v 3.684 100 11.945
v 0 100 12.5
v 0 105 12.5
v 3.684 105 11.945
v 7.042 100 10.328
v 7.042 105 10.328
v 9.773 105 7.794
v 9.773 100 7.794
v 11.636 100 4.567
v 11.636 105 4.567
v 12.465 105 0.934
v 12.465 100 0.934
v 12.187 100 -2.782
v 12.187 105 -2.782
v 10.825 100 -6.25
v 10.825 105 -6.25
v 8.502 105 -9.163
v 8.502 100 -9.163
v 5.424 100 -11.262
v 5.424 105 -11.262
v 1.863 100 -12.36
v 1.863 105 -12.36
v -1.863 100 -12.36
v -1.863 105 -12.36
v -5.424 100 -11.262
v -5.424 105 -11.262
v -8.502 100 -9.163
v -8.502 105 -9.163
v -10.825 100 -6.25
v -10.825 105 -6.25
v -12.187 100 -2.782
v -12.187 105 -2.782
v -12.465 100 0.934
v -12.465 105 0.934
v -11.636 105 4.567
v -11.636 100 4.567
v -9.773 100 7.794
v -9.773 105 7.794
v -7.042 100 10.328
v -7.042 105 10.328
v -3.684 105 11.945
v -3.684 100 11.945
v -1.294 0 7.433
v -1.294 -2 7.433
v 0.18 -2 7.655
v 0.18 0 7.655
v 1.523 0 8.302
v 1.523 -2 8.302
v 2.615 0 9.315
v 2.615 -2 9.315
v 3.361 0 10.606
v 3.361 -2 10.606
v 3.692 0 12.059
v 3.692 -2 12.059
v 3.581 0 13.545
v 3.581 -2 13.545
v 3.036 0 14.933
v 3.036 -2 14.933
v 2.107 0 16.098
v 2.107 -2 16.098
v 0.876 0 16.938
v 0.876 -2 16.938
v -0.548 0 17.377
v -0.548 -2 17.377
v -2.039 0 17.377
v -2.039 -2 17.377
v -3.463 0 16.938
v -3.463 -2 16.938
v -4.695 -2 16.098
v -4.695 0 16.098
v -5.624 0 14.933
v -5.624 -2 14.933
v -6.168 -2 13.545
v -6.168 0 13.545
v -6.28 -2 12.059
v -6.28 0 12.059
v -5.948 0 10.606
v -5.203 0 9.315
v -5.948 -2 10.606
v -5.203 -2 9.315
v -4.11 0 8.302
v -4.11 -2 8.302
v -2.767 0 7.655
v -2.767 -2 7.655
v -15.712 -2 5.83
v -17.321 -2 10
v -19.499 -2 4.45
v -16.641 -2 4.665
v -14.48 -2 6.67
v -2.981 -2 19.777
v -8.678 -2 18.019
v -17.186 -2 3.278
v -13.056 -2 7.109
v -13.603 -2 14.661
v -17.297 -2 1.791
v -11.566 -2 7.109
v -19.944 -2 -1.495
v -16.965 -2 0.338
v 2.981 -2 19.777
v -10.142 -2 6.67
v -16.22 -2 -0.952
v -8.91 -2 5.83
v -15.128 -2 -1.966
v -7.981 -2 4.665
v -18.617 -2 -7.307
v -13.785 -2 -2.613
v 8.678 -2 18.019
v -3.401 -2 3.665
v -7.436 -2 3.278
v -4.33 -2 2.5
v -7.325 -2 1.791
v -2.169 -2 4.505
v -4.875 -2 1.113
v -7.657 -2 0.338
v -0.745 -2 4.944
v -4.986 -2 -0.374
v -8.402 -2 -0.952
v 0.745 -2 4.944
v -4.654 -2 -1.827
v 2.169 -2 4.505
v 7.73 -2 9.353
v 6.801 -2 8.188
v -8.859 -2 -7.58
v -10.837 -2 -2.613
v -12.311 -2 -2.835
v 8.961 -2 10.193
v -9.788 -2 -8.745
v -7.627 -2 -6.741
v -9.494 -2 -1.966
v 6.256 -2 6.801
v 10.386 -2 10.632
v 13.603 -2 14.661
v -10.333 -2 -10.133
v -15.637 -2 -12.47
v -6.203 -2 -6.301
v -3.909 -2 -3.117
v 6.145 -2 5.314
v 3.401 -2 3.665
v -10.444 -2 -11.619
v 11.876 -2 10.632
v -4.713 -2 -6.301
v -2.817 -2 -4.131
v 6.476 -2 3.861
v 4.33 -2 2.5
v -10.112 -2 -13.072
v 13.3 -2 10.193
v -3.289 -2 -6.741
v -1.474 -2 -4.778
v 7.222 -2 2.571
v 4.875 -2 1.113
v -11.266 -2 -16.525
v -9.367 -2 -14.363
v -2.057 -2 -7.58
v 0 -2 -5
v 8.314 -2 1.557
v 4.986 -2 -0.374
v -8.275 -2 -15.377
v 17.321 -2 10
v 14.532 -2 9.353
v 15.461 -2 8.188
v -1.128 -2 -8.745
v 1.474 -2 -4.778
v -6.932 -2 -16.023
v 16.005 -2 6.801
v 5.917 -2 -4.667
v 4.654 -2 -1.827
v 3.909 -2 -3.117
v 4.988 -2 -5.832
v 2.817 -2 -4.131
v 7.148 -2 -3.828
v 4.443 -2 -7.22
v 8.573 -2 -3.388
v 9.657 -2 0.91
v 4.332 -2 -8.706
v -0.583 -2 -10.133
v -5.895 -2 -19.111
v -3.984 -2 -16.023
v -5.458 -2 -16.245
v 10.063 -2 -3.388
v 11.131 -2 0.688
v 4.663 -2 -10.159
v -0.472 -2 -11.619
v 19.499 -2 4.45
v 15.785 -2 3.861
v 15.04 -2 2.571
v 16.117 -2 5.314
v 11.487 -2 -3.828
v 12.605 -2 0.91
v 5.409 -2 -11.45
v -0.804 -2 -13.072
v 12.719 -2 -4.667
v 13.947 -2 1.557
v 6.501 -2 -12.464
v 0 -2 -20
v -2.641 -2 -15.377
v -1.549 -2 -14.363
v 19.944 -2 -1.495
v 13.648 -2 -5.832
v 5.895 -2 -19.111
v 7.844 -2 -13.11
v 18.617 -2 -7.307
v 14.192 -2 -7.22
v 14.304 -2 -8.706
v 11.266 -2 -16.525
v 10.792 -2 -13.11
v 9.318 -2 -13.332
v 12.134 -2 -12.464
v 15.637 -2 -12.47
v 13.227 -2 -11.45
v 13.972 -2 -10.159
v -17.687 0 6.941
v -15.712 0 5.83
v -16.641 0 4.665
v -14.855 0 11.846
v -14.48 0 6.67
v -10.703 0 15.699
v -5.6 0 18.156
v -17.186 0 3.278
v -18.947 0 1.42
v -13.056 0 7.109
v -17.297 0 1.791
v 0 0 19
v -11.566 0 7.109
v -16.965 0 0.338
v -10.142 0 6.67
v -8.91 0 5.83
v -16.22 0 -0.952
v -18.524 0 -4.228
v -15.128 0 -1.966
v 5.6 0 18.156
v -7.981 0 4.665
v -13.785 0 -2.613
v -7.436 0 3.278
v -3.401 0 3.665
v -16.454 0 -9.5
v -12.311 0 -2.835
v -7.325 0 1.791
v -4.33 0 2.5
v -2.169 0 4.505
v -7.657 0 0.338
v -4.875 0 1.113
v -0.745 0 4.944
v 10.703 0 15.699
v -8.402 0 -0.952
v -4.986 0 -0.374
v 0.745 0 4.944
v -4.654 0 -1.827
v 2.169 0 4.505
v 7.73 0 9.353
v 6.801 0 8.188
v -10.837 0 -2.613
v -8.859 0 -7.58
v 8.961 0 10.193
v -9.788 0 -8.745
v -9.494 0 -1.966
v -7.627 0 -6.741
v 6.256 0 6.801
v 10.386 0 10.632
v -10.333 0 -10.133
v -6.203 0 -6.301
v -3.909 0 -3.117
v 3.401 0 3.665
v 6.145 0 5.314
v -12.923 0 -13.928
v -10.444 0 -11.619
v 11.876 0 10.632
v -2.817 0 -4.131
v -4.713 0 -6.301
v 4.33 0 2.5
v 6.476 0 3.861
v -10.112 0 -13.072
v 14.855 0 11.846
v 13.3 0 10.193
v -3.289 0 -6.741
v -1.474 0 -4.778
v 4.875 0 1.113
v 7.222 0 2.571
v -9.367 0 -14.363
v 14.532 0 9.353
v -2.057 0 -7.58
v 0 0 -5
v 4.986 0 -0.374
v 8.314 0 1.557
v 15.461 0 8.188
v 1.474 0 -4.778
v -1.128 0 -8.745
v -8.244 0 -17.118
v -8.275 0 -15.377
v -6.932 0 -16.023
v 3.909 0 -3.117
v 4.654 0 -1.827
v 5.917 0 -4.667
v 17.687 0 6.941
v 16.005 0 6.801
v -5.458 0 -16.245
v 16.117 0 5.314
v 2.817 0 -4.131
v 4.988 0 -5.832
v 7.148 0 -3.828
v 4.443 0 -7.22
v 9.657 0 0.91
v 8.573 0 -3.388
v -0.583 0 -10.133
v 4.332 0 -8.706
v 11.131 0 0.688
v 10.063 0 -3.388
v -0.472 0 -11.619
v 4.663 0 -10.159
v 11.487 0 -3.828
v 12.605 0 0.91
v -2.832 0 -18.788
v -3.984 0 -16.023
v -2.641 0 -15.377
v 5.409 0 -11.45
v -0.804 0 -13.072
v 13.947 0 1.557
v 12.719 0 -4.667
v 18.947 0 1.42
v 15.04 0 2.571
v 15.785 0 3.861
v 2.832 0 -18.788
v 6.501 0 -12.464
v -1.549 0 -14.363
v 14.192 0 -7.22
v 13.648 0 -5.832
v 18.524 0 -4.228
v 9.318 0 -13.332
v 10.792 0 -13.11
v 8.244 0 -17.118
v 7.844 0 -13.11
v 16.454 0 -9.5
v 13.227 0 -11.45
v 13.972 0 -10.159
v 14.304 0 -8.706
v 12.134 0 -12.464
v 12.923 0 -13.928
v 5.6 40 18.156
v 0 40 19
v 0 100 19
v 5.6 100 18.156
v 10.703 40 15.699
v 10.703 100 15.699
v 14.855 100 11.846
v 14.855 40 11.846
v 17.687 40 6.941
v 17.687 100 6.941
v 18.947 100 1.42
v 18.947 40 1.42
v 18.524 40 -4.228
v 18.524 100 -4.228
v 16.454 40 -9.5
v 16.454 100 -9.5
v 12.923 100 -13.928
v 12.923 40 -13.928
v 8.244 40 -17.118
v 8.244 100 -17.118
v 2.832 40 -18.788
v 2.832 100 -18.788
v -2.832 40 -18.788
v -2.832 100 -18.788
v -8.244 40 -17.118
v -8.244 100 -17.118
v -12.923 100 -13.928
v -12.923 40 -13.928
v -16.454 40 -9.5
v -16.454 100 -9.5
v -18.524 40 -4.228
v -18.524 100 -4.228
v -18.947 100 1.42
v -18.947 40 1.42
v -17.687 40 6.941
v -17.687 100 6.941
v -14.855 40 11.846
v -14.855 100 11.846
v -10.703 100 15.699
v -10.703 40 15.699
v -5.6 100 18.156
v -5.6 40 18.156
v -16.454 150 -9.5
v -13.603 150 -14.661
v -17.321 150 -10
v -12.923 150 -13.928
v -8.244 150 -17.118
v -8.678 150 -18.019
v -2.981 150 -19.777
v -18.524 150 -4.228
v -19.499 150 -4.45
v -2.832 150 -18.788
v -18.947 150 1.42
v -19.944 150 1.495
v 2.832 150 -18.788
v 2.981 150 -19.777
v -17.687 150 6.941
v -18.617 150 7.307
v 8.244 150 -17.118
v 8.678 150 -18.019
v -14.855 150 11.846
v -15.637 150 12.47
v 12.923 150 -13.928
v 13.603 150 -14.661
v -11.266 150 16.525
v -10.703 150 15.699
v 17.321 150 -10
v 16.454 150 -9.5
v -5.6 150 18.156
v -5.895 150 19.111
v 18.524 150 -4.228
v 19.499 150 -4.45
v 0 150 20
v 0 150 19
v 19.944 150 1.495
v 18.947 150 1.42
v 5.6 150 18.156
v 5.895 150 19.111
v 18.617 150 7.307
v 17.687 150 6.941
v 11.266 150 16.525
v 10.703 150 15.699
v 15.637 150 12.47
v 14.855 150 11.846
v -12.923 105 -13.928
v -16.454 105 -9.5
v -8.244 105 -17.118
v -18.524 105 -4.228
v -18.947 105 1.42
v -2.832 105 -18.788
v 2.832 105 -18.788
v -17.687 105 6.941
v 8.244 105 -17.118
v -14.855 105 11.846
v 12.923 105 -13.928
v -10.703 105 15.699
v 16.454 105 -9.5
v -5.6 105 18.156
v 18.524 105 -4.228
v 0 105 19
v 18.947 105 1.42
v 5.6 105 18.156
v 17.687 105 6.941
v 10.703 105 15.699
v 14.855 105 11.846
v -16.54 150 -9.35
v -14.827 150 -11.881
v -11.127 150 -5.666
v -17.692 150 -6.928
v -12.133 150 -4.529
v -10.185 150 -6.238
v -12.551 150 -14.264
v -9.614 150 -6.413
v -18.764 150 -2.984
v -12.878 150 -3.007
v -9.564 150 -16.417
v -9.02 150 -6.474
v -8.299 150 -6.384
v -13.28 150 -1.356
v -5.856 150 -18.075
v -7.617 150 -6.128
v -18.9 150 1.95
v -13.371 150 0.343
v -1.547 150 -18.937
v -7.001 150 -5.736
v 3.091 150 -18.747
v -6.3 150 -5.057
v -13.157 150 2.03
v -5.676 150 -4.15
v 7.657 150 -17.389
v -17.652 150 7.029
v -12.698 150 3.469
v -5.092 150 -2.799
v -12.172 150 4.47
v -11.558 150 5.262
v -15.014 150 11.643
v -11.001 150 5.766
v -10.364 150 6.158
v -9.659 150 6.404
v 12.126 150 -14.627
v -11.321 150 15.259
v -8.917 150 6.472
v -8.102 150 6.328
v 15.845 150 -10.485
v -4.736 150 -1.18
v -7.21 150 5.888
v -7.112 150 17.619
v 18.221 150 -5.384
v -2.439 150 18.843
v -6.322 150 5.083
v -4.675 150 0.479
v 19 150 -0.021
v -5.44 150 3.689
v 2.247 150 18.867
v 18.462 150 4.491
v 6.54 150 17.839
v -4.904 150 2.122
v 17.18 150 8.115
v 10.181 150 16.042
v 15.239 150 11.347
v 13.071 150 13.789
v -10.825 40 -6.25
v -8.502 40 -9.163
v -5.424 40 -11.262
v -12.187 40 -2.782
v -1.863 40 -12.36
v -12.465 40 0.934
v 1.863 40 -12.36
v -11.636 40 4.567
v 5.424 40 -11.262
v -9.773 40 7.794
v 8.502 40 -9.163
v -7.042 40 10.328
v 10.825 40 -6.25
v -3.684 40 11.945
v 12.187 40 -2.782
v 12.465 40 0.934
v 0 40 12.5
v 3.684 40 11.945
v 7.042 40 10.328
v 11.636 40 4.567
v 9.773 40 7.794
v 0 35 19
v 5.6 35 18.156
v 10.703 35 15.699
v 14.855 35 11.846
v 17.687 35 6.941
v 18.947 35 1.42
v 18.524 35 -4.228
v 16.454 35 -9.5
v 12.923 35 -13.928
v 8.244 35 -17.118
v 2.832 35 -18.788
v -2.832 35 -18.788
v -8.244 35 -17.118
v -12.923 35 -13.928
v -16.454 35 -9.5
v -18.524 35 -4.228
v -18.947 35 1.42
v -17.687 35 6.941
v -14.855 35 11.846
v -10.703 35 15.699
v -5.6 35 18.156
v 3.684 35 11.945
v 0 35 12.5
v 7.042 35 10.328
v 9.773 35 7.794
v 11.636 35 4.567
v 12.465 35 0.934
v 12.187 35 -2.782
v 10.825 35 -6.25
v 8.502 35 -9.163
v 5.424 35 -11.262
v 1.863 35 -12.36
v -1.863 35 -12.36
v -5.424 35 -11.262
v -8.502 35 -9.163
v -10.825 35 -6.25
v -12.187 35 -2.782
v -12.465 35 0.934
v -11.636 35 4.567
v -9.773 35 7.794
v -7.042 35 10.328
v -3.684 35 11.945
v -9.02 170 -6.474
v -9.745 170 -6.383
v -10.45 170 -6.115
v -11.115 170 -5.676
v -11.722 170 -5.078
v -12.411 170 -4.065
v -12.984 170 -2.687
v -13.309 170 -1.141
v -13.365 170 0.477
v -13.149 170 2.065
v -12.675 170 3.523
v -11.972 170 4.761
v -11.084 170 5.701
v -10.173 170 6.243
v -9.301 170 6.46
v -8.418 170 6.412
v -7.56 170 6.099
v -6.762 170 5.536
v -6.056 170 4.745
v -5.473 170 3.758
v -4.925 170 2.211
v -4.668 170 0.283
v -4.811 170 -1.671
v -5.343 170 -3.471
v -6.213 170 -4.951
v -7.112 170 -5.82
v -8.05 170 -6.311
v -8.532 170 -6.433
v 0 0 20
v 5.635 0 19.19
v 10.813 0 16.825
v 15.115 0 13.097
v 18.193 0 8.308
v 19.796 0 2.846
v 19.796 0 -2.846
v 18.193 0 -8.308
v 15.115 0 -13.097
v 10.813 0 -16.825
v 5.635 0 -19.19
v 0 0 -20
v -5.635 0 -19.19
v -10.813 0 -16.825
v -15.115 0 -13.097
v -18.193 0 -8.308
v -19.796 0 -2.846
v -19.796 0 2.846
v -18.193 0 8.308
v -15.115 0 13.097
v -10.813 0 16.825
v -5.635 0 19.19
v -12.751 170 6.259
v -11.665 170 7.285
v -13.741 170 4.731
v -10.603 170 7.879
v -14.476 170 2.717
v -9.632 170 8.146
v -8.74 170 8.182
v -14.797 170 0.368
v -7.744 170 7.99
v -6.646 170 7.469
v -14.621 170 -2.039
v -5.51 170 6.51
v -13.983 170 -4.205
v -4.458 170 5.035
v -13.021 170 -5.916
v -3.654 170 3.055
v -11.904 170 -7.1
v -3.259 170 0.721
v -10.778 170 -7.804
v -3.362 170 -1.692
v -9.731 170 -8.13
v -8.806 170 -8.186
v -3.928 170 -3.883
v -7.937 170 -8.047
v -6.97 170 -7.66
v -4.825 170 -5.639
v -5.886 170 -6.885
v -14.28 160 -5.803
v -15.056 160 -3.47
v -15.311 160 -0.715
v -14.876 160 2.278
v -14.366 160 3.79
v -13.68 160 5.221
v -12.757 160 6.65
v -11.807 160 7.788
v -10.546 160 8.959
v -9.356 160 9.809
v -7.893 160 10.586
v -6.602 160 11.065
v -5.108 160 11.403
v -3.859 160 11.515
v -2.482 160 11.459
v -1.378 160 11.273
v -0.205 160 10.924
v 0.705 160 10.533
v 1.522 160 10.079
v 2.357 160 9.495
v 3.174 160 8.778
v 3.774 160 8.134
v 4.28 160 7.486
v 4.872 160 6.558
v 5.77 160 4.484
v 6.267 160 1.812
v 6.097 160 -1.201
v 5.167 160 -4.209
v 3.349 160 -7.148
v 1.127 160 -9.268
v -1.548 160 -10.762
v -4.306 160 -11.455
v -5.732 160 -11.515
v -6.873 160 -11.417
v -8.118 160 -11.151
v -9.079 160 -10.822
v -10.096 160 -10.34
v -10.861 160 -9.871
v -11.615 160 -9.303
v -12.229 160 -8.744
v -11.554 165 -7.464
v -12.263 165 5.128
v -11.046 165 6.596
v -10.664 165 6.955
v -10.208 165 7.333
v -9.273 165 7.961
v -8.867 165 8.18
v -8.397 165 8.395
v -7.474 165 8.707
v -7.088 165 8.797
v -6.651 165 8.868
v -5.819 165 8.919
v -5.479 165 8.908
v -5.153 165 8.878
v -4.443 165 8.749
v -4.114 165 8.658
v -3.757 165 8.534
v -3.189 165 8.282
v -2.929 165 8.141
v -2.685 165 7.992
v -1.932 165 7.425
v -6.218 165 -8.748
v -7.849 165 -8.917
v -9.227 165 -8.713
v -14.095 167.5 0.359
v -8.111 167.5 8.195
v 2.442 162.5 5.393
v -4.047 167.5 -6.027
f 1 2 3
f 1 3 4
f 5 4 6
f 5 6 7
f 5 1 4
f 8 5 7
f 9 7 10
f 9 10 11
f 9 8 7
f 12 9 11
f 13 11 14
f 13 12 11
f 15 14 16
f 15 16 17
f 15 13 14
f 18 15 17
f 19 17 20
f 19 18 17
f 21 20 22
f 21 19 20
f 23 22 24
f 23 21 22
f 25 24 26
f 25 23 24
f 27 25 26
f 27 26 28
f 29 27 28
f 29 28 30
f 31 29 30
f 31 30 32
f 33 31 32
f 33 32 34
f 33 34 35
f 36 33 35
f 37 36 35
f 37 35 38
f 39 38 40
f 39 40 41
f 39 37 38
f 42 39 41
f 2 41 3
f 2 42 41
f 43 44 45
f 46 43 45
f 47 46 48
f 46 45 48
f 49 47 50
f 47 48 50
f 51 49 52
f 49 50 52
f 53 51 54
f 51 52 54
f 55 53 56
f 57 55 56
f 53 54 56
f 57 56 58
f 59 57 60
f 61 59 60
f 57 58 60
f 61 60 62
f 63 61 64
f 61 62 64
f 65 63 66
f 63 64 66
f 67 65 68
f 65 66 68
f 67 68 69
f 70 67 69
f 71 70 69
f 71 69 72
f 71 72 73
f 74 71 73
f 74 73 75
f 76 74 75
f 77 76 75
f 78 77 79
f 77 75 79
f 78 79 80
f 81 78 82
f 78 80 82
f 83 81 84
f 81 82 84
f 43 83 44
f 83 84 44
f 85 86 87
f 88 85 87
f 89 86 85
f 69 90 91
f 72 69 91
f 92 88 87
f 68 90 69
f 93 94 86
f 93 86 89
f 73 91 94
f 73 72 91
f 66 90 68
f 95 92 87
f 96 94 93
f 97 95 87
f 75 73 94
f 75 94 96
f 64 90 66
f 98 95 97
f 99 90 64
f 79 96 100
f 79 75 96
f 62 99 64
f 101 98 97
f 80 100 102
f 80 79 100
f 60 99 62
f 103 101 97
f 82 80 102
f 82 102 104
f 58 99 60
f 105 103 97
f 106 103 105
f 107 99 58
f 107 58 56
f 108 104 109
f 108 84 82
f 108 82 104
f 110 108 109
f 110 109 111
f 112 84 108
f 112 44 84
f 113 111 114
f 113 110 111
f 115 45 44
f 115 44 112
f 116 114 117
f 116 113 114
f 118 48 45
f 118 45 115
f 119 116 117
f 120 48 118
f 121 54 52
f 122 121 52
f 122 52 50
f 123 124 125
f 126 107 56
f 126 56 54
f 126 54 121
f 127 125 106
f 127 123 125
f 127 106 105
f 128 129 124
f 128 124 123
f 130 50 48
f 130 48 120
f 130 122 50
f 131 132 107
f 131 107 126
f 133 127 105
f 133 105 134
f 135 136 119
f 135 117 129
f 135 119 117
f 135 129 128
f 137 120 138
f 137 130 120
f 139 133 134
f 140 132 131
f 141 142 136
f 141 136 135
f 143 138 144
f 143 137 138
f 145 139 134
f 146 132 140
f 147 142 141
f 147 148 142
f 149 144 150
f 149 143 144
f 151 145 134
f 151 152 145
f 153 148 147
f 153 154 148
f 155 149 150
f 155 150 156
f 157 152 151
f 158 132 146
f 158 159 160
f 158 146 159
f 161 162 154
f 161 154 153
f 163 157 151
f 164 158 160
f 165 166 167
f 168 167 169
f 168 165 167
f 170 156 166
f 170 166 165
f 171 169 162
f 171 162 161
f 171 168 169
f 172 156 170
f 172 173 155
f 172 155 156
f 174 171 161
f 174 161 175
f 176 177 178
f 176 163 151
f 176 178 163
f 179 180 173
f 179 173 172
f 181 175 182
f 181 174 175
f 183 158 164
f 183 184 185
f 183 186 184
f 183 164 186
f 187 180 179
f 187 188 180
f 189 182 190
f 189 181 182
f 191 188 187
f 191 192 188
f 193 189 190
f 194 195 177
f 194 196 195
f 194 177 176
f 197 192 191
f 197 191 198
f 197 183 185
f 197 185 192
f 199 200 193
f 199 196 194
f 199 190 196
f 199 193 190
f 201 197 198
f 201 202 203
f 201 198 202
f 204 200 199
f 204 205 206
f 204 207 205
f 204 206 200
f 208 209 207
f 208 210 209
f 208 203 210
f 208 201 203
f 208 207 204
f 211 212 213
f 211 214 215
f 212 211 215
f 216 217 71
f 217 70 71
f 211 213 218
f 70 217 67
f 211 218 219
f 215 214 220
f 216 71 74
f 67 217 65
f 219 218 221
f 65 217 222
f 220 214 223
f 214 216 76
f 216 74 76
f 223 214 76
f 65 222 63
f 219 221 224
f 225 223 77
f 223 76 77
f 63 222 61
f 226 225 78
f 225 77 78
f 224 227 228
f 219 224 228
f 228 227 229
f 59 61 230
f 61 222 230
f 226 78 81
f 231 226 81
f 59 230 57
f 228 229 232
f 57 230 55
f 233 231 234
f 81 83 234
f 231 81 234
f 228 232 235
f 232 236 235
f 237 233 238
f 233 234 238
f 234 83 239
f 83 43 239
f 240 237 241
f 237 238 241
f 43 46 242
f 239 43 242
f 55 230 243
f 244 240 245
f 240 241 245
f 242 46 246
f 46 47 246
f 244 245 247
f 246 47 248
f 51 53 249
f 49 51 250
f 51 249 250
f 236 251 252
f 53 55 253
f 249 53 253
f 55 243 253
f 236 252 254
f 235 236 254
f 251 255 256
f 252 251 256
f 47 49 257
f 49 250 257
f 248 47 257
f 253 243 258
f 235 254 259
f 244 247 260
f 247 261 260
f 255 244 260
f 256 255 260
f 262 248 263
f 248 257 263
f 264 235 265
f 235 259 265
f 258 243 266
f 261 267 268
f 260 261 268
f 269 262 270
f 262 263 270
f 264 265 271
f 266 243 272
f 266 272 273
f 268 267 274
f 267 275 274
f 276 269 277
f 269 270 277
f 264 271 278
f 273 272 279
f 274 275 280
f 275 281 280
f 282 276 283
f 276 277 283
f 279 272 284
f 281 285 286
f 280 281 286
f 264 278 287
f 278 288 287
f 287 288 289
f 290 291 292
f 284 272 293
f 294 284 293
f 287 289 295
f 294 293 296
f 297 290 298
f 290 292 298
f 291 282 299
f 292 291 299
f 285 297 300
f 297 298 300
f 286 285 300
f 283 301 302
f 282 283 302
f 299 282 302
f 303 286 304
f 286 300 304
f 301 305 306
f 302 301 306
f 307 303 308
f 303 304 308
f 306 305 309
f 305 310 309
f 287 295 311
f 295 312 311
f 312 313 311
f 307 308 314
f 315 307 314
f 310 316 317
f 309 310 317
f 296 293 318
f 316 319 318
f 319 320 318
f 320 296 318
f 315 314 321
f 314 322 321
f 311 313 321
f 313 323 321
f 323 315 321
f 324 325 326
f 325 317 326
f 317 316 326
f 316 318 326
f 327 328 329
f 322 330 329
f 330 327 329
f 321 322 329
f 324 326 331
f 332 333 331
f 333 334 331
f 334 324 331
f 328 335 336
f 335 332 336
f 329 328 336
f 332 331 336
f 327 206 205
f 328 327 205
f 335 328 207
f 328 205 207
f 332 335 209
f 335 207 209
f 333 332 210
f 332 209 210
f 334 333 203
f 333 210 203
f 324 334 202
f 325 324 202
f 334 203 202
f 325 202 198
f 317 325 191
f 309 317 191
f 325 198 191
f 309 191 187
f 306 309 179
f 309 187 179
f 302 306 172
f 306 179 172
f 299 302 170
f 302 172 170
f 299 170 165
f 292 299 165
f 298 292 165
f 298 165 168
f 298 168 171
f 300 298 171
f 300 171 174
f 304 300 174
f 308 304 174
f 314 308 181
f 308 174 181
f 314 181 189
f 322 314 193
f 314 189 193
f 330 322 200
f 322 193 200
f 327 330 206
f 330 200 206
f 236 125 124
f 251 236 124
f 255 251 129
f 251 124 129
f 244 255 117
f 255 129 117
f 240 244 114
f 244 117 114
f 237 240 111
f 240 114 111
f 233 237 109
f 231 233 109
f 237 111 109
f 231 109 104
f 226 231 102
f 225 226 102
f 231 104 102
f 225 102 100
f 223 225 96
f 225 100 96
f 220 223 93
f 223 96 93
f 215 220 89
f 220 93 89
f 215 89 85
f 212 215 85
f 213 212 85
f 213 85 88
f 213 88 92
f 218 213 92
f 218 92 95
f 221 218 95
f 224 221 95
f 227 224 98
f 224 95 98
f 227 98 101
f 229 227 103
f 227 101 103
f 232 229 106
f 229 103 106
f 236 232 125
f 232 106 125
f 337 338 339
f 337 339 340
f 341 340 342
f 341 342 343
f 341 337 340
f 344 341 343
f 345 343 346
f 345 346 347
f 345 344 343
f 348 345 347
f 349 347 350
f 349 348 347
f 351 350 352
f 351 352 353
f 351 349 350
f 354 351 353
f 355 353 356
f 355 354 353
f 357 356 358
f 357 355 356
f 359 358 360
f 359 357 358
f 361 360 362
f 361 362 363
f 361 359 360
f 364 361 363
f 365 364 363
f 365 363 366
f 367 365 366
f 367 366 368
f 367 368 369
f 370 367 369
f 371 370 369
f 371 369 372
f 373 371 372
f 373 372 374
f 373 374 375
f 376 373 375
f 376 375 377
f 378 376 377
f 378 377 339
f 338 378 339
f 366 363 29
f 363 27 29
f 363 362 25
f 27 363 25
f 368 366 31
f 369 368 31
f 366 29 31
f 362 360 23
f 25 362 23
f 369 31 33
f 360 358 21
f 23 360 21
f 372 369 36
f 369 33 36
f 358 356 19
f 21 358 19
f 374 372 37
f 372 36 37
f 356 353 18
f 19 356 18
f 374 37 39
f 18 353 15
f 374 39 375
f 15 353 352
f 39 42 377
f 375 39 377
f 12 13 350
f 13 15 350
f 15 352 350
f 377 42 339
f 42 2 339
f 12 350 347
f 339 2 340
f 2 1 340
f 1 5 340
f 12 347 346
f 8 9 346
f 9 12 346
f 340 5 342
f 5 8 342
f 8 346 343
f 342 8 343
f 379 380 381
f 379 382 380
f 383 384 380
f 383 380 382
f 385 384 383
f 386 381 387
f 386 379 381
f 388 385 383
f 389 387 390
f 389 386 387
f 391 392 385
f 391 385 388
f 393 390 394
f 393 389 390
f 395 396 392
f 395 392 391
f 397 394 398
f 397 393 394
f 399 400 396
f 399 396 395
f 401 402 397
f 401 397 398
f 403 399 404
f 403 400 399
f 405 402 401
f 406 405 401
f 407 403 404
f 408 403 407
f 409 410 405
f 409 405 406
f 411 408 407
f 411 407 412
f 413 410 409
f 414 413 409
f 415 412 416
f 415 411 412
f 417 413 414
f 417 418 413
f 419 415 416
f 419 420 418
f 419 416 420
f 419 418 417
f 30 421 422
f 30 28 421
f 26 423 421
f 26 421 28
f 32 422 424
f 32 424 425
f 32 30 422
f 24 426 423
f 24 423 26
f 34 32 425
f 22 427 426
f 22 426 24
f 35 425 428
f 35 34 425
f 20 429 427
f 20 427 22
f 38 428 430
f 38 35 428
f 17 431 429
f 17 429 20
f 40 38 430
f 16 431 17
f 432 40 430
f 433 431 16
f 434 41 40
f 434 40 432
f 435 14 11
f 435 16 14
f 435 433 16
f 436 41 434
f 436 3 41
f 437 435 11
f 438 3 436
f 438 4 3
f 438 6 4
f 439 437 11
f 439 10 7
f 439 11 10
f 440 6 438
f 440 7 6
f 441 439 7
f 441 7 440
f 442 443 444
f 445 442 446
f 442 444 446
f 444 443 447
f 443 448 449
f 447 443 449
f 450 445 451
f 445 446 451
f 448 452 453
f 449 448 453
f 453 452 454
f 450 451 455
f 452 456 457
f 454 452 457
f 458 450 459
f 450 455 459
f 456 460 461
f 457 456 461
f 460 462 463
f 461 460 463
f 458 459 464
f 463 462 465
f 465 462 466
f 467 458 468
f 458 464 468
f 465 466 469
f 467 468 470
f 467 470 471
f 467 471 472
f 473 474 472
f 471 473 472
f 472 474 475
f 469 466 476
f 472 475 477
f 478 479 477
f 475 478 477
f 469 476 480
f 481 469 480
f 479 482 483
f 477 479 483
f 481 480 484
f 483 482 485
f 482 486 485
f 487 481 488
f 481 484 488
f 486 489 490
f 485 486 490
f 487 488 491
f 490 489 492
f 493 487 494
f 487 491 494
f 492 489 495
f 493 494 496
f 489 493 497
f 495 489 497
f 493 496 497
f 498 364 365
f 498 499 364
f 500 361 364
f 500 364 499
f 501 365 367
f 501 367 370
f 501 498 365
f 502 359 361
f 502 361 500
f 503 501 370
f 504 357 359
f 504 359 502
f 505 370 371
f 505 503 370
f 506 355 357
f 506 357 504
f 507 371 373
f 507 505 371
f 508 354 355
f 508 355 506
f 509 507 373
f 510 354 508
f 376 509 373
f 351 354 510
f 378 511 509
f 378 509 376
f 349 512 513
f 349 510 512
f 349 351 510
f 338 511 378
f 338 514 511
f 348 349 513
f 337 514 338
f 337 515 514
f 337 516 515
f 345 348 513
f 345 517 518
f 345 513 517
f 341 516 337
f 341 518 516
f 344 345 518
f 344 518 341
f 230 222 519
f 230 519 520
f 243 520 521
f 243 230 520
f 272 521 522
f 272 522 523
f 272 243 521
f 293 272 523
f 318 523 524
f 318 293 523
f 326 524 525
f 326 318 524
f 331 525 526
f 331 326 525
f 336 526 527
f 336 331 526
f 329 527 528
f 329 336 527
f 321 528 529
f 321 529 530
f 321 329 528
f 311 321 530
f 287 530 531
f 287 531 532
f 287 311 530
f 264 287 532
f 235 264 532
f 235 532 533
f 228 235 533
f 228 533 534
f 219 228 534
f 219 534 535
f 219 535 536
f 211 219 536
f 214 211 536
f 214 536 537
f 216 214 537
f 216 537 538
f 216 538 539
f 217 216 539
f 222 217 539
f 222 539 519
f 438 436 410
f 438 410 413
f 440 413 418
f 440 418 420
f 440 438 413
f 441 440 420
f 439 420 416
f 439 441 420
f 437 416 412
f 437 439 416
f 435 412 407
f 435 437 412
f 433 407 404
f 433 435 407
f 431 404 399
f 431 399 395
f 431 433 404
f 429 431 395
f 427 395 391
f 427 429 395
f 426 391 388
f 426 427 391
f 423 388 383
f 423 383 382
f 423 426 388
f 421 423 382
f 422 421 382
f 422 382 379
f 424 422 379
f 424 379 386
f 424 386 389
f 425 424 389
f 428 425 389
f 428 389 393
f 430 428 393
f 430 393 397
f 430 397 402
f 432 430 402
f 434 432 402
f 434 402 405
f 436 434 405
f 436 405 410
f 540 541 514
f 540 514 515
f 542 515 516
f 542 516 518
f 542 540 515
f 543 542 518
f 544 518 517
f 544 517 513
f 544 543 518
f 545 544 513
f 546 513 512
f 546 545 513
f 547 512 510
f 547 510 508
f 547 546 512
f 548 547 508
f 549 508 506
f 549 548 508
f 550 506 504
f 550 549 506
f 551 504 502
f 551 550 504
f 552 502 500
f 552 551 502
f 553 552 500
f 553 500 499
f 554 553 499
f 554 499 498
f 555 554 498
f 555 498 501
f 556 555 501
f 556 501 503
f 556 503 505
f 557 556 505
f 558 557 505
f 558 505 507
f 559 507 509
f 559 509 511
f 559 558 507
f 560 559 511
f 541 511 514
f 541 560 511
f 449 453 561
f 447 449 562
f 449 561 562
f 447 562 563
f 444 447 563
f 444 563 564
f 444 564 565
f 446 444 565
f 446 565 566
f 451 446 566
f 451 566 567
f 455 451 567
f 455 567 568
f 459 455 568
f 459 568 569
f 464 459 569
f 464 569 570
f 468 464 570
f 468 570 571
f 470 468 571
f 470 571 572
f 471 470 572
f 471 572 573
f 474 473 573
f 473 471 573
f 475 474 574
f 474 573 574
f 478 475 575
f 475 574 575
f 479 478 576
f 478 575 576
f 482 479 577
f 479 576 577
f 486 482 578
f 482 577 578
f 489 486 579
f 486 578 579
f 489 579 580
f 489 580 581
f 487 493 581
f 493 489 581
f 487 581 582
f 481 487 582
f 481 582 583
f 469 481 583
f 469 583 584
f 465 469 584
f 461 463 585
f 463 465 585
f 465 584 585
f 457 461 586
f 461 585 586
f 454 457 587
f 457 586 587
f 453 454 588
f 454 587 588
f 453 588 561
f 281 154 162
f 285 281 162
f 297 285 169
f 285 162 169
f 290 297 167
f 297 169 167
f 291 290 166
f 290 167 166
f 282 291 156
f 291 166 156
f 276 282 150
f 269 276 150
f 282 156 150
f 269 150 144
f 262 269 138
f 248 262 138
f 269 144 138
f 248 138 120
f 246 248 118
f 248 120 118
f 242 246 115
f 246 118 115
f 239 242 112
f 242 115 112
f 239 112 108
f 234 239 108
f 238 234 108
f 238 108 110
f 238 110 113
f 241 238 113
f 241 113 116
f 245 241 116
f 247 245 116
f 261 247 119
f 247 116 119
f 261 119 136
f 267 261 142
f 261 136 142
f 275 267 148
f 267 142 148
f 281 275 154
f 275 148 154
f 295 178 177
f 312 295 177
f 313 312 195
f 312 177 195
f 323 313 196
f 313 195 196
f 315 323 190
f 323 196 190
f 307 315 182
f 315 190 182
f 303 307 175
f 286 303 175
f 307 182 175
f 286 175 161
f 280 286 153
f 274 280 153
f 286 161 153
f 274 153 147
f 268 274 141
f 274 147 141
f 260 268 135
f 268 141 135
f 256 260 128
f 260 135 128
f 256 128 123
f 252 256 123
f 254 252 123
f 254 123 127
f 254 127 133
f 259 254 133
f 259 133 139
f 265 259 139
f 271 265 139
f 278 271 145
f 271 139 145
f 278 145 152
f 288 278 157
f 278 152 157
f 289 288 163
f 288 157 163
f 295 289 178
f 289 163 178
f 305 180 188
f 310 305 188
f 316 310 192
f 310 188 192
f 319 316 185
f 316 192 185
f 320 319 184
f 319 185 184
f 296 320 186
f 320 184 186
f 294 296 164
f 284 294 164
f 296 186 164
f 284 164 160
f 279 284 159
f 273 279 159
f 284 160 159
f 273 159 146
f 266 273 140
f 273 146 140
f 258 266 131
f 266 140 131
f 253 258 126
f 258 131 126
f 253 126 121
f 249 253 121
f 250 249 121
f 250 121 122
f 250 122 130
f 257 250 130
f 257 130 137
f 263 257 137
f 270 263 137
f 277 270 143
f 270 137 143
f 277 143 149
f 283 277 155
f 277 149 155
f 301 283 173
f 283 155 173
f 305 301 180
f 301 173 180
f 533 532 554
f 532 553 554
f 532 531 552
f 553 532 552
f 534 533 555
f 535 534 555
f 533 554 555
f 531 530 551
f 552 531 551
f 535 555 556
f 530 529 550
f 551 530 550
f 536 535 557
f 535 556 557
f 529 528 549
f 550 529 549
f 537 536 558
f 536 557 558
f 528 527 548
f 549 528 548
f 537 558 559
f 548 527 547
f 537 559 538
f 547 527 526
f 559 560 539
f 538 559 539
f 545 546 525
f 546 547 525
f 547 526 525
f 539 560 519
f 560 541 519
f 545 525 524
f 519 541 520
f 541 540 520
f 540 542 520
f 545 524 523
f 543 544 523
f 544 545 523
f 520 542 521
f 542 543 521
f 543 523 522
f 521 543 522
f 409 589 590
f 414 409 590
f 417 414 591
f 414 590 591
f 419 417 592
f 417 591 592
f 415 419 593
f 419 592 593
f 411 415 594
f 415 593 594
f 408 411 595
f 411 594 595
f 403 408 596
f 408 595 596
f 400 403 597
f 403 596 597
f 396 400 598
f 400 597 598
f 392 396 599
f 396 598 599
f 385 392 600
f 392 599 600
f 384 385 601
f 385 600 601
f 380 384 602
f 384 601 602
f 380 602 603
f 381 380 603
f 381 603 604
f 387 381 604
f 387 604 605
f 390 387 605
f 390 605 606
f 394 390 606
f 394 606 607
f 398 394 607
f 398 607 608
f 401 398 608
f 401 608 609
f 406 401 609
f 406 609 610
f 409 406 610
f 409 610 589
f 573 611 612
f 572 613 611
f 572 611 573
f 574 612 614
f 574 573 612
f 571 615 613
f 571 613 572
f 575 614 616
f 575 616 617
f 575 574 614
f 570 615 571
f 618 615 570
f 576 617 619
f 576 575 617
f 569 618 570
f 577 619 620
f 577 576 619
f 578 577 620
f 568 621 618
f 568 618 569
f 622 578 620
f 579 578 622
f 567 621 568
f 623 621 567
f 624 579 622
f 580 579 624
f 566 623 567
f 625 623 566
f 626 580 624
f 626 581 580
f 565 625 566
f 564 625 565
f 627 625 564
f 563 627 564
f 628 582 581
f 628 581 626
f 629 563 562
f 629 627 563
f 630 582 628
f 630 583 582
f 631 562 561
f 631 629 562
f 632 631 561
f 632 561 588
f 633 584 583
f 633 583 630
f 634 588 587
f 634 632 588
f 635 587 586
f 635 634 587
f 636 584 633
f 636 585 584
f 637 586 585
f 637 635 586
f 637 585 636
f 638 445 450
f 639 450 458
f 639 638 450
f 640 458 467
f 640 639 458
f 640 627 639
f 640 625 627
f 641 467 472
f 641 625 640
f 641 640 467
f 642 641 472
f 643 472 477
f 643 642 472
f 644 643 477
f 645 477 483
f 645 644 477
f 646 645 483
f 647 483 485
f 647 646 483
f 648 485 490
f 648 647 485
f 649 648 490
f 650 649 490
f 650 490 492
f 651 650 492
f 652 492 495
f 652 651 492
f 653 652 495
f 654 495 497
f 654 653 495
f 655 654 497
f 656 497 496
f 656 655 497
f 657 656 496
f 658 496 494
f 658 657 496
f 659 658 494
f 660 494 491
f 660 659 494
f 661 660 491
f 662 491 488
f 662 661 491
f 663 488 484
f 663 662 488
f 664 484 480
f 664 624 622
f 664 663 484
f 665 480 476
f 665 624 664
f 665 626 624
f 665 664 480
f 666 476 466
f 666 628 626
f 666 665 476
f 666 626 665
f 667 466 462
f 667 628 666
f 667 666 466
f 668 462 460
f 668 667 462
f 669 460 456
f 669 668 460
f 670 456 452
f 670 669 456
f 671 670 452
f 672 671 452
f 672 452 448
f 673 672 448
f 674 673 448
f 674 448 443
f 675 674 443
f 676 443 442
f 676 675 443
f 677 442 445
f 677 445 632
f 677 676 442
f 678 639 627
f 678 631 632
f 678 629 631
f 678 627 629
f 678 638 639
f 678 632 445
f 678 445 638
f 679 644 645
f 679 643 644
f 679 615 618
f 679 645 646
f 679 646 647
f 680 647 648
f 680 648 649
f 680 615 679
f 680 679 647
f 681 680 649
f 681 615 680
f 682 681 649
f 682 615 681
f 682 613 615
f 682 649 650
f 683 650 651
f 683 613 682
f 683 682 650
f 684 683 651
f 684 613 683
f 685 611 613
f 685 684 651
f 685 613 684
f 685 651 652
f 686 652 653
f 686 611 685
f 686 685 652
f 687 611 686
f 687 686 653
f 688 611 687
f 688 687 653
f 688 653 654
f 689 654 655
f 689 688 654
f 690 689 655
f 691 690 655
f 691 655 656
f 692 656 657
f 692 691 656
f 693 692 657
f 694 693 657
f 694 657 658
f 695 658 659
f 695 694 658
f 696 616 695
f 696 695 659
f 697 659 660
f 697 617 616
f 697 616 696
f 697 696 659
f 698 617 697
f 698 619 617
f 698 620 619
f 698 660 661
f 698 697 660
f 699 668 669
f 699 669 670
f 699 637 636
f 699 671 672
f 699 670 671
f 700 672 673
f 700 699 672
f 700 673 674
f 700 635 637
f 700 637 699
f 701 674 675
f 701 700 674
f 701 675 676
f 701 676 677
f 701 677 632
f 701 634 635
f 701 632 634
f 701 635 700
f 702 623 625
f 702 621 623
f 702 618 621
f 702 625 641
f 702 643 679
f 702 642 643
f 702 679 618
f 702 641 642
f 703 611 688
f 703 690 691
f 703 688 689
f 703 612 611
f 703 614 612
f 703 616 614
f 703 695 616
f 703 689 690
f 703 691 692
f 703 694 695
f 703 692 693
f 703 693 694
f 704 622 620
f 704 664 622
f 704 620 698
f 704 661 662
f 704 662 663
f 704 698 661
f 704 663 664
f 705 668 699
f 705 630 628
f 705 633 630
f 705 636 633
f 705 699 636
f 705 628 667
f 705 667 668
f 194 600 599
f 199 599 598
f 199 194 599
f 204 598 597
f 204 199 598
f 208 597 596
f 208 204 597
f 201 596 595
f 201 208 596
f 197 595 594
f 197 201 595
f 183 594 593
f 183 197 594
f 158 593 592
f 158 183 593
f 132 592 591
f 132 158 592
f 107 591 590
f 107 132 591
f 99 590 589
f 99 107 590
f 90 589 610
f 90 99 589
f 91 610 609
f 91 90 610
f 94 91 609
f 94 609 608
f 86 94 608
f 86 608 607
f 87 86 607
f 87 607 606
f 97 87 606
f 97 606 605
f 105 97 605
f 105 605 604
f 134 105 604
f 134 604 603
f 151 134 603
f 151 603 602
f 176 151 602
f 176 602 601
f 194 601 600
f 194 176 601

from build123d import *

# Parameters (mm, degrees)
SKETCH1_R           = 20
SKETCH1_R_2         = 19
BOSS_EXTRUDE1_DEPTH = 150
SKETCH7_RX          = 6.473584377
SKETCH7_RY          = 4.356630244
CUT_EXTRUDE3_DEPTH  = 173.336879396
BOSS_EXTRUDE3_START = 2
SKETCH9_R           = 20
BOSS_EXTRUDE3_DEPTH = 2
SKETCH10_R          = 5
CUT_EXTRUDE5_DEPTH  = 2
SKETCH11_R          = 19
SKETCH11_R_2        = 12.5
BOSS_EXTRUDE4_DEPTH = 5
SKETCH12_R          = 19
SKETCH12_R_2        = 12.5
BOSS_EXTRUDE5_DEPTH = 5


with BuildPart() as part:
    # Sketch1 → Boss-Extrude1 (new body)
    with BuildSketch(Plane(origin=(0, 0, 0), x_dir=(1, 0, 0), z_dir=(0, 1, 0))):
        with Locations(Location((0, 0, 0), (0, 0, 270))):
            Circle(SKETCH1_R)
        with Locations(Location((0, 0, 0), (0, 0, 270))):
            Circle(SKETCH1_R_2, mode=Mode.SUBTRACT)
    extrude(amount=BOSS_EXTRUDE1_DEPTH)

    # Sketch9 → Boss-Extrude3 (add)
    with BuildSketch(Plane.XZ.offset(BOSS_EXTRUDE3_START)):
        with Locations(Location((0, 0, 0), (0, 0, 270))):
            Circle(SKETCH9_R)
    extrude(amount=-BOSS_EXTRUDE3_DEPTH)

    # Sketch10 → Cut-Extrude5 (cut)
    with BuildSketch(Plane.XZ.offset(2)):
        with Locations(Location((0, 0, 0), (0, 0, 270))):
            Circle(SKETCH10_R)
        with Locations(Location((-1.293672519, 12.432876233, 0), (0, 0, 270))):
            Circle(SKETCH10_R)
        with Locations(Location((11.130848453, 5.688076363, 0), (0, 0, 270))):
            Circle(SKETCH10_R)
        with Locations(Location((9.317782084, -8.332402837, 0), (0, 0, 270))):
            Circle(SKETCH10_R)
        with Locations(Location((-5.457980639, -11.245463412, 0), (0, 0, 270))):
            Circle(SKETCH10_R)
        with Locations(Location((-12.311057922, 2.165144991, 0), (0, 0, 270))):
            Circle(SKETCH10_R)
    extrude(amount=-CUT_EXTRUDE5_DEPTH, mode=Mode.SUBTRACT)

    # Sketch11 → Boss-Extrude4 (add)
    with BuildSketch(Plane(origin=(0, 35, 0), x_dir=(1, 0, 0), z_dir=(0, 1, 0))):
        with Locations(Location((0, 0, 0), (0, 0, 270))):
            Circle(SKETCH11_R)
        with Locations(Location((0, 0, 0), (0, 0, 270))):
            Circle(SKETCH11_R_2, mode=Mode.SUBTRACT)
    extrude(amount=BOSS_EXTRUDE4_DEPTH)

    # Sketch12 → Boss-Extrude5 (add)
    with BuildSketch(Plane(origin=(0, 100, 0), x_dir=(1, 0, 0), z_dir=(0, 1, 0))):
        with Locations(Location((0, 0, 0), (0, 0, 270))):
            Circle(SKETCH12_R)
        with Locations(Location((0, 0, 0), (0, 0, 270))):
            Circle(SKETCH12_R_2, mode=Mode.SUBTRACT)
    extrude(amount=BOSS_EXTRUDE5_DEPTH)


with BuildPart() as body_2:
    # Loft1: read off the stored shape, not the designer's step
    # Loft1: loft between two sections, ruled curve by curve
    loft1_from = [
        Edge.make_bspline([(-17.691995775, 150, -6.927718635), (-31.547433046, 150, 28.456272915), (3.836558504, 150, 42.311710186), (17.691995775, 150, 6.927718635), (31.547433046, 150, -28.456272915), (-3.836558504, 150, -42.311710186), (-17.691995775, 150, -6.927718635)], [0, 0, 0, 0, 0.5, 0.5, 0.5, 1, 1, 1, 1], 3, [1, 0.333333333, 0.333333333, 1, 0.333333333, 0.333333333, 1]),
    ]
    loft1_to = [
        Edge.make_bspline([(-8.805610447, 170, -8.186057952), (-20.364084354, 170, -8.793591776), (-20.792994332, 170, 7.578524127), (-9.234520424, 170, 8.186057952), (2.323953483, 170, 8.793591776), (2.75286346, 170, -7.578524127), (-8.805610447, 170, -8.186057952)], [0, 0, 0, 0, 0.5, 0.5, 0.5, 1, 1, 1, 1], 3, [1, 0.333333333, 0.333333333, 1, 0.333333333, 0.333333333, 1]),
    ]
    loft1 = Solid(Shell([*[Face.make_surface_from_curves(loft1_from[k], loft1_to[k]) for k in range(1)], Face(Wire(loft1_from)), Face(Wire(loft1_to))]))
    add(loft1)

    # Sketch7 → Cut-Extrude3 (cut, through all)
    with BuildSketch(Plane(origin=(0, 170, 0), x_dir=(1, 0, 0), z_dir=(0, 1, 0))):
        with Locations(Location((-9.020065436, 0), (0, 0, 90))):
            Ellipse(SKETCH7_RX, SKETCH7_RY)
    extrude(amount=-CUT_EXTRUDE3_DEPTH, mode=Mode.SUBTRACT)


solid = Compound([part.part, body_2.part])
